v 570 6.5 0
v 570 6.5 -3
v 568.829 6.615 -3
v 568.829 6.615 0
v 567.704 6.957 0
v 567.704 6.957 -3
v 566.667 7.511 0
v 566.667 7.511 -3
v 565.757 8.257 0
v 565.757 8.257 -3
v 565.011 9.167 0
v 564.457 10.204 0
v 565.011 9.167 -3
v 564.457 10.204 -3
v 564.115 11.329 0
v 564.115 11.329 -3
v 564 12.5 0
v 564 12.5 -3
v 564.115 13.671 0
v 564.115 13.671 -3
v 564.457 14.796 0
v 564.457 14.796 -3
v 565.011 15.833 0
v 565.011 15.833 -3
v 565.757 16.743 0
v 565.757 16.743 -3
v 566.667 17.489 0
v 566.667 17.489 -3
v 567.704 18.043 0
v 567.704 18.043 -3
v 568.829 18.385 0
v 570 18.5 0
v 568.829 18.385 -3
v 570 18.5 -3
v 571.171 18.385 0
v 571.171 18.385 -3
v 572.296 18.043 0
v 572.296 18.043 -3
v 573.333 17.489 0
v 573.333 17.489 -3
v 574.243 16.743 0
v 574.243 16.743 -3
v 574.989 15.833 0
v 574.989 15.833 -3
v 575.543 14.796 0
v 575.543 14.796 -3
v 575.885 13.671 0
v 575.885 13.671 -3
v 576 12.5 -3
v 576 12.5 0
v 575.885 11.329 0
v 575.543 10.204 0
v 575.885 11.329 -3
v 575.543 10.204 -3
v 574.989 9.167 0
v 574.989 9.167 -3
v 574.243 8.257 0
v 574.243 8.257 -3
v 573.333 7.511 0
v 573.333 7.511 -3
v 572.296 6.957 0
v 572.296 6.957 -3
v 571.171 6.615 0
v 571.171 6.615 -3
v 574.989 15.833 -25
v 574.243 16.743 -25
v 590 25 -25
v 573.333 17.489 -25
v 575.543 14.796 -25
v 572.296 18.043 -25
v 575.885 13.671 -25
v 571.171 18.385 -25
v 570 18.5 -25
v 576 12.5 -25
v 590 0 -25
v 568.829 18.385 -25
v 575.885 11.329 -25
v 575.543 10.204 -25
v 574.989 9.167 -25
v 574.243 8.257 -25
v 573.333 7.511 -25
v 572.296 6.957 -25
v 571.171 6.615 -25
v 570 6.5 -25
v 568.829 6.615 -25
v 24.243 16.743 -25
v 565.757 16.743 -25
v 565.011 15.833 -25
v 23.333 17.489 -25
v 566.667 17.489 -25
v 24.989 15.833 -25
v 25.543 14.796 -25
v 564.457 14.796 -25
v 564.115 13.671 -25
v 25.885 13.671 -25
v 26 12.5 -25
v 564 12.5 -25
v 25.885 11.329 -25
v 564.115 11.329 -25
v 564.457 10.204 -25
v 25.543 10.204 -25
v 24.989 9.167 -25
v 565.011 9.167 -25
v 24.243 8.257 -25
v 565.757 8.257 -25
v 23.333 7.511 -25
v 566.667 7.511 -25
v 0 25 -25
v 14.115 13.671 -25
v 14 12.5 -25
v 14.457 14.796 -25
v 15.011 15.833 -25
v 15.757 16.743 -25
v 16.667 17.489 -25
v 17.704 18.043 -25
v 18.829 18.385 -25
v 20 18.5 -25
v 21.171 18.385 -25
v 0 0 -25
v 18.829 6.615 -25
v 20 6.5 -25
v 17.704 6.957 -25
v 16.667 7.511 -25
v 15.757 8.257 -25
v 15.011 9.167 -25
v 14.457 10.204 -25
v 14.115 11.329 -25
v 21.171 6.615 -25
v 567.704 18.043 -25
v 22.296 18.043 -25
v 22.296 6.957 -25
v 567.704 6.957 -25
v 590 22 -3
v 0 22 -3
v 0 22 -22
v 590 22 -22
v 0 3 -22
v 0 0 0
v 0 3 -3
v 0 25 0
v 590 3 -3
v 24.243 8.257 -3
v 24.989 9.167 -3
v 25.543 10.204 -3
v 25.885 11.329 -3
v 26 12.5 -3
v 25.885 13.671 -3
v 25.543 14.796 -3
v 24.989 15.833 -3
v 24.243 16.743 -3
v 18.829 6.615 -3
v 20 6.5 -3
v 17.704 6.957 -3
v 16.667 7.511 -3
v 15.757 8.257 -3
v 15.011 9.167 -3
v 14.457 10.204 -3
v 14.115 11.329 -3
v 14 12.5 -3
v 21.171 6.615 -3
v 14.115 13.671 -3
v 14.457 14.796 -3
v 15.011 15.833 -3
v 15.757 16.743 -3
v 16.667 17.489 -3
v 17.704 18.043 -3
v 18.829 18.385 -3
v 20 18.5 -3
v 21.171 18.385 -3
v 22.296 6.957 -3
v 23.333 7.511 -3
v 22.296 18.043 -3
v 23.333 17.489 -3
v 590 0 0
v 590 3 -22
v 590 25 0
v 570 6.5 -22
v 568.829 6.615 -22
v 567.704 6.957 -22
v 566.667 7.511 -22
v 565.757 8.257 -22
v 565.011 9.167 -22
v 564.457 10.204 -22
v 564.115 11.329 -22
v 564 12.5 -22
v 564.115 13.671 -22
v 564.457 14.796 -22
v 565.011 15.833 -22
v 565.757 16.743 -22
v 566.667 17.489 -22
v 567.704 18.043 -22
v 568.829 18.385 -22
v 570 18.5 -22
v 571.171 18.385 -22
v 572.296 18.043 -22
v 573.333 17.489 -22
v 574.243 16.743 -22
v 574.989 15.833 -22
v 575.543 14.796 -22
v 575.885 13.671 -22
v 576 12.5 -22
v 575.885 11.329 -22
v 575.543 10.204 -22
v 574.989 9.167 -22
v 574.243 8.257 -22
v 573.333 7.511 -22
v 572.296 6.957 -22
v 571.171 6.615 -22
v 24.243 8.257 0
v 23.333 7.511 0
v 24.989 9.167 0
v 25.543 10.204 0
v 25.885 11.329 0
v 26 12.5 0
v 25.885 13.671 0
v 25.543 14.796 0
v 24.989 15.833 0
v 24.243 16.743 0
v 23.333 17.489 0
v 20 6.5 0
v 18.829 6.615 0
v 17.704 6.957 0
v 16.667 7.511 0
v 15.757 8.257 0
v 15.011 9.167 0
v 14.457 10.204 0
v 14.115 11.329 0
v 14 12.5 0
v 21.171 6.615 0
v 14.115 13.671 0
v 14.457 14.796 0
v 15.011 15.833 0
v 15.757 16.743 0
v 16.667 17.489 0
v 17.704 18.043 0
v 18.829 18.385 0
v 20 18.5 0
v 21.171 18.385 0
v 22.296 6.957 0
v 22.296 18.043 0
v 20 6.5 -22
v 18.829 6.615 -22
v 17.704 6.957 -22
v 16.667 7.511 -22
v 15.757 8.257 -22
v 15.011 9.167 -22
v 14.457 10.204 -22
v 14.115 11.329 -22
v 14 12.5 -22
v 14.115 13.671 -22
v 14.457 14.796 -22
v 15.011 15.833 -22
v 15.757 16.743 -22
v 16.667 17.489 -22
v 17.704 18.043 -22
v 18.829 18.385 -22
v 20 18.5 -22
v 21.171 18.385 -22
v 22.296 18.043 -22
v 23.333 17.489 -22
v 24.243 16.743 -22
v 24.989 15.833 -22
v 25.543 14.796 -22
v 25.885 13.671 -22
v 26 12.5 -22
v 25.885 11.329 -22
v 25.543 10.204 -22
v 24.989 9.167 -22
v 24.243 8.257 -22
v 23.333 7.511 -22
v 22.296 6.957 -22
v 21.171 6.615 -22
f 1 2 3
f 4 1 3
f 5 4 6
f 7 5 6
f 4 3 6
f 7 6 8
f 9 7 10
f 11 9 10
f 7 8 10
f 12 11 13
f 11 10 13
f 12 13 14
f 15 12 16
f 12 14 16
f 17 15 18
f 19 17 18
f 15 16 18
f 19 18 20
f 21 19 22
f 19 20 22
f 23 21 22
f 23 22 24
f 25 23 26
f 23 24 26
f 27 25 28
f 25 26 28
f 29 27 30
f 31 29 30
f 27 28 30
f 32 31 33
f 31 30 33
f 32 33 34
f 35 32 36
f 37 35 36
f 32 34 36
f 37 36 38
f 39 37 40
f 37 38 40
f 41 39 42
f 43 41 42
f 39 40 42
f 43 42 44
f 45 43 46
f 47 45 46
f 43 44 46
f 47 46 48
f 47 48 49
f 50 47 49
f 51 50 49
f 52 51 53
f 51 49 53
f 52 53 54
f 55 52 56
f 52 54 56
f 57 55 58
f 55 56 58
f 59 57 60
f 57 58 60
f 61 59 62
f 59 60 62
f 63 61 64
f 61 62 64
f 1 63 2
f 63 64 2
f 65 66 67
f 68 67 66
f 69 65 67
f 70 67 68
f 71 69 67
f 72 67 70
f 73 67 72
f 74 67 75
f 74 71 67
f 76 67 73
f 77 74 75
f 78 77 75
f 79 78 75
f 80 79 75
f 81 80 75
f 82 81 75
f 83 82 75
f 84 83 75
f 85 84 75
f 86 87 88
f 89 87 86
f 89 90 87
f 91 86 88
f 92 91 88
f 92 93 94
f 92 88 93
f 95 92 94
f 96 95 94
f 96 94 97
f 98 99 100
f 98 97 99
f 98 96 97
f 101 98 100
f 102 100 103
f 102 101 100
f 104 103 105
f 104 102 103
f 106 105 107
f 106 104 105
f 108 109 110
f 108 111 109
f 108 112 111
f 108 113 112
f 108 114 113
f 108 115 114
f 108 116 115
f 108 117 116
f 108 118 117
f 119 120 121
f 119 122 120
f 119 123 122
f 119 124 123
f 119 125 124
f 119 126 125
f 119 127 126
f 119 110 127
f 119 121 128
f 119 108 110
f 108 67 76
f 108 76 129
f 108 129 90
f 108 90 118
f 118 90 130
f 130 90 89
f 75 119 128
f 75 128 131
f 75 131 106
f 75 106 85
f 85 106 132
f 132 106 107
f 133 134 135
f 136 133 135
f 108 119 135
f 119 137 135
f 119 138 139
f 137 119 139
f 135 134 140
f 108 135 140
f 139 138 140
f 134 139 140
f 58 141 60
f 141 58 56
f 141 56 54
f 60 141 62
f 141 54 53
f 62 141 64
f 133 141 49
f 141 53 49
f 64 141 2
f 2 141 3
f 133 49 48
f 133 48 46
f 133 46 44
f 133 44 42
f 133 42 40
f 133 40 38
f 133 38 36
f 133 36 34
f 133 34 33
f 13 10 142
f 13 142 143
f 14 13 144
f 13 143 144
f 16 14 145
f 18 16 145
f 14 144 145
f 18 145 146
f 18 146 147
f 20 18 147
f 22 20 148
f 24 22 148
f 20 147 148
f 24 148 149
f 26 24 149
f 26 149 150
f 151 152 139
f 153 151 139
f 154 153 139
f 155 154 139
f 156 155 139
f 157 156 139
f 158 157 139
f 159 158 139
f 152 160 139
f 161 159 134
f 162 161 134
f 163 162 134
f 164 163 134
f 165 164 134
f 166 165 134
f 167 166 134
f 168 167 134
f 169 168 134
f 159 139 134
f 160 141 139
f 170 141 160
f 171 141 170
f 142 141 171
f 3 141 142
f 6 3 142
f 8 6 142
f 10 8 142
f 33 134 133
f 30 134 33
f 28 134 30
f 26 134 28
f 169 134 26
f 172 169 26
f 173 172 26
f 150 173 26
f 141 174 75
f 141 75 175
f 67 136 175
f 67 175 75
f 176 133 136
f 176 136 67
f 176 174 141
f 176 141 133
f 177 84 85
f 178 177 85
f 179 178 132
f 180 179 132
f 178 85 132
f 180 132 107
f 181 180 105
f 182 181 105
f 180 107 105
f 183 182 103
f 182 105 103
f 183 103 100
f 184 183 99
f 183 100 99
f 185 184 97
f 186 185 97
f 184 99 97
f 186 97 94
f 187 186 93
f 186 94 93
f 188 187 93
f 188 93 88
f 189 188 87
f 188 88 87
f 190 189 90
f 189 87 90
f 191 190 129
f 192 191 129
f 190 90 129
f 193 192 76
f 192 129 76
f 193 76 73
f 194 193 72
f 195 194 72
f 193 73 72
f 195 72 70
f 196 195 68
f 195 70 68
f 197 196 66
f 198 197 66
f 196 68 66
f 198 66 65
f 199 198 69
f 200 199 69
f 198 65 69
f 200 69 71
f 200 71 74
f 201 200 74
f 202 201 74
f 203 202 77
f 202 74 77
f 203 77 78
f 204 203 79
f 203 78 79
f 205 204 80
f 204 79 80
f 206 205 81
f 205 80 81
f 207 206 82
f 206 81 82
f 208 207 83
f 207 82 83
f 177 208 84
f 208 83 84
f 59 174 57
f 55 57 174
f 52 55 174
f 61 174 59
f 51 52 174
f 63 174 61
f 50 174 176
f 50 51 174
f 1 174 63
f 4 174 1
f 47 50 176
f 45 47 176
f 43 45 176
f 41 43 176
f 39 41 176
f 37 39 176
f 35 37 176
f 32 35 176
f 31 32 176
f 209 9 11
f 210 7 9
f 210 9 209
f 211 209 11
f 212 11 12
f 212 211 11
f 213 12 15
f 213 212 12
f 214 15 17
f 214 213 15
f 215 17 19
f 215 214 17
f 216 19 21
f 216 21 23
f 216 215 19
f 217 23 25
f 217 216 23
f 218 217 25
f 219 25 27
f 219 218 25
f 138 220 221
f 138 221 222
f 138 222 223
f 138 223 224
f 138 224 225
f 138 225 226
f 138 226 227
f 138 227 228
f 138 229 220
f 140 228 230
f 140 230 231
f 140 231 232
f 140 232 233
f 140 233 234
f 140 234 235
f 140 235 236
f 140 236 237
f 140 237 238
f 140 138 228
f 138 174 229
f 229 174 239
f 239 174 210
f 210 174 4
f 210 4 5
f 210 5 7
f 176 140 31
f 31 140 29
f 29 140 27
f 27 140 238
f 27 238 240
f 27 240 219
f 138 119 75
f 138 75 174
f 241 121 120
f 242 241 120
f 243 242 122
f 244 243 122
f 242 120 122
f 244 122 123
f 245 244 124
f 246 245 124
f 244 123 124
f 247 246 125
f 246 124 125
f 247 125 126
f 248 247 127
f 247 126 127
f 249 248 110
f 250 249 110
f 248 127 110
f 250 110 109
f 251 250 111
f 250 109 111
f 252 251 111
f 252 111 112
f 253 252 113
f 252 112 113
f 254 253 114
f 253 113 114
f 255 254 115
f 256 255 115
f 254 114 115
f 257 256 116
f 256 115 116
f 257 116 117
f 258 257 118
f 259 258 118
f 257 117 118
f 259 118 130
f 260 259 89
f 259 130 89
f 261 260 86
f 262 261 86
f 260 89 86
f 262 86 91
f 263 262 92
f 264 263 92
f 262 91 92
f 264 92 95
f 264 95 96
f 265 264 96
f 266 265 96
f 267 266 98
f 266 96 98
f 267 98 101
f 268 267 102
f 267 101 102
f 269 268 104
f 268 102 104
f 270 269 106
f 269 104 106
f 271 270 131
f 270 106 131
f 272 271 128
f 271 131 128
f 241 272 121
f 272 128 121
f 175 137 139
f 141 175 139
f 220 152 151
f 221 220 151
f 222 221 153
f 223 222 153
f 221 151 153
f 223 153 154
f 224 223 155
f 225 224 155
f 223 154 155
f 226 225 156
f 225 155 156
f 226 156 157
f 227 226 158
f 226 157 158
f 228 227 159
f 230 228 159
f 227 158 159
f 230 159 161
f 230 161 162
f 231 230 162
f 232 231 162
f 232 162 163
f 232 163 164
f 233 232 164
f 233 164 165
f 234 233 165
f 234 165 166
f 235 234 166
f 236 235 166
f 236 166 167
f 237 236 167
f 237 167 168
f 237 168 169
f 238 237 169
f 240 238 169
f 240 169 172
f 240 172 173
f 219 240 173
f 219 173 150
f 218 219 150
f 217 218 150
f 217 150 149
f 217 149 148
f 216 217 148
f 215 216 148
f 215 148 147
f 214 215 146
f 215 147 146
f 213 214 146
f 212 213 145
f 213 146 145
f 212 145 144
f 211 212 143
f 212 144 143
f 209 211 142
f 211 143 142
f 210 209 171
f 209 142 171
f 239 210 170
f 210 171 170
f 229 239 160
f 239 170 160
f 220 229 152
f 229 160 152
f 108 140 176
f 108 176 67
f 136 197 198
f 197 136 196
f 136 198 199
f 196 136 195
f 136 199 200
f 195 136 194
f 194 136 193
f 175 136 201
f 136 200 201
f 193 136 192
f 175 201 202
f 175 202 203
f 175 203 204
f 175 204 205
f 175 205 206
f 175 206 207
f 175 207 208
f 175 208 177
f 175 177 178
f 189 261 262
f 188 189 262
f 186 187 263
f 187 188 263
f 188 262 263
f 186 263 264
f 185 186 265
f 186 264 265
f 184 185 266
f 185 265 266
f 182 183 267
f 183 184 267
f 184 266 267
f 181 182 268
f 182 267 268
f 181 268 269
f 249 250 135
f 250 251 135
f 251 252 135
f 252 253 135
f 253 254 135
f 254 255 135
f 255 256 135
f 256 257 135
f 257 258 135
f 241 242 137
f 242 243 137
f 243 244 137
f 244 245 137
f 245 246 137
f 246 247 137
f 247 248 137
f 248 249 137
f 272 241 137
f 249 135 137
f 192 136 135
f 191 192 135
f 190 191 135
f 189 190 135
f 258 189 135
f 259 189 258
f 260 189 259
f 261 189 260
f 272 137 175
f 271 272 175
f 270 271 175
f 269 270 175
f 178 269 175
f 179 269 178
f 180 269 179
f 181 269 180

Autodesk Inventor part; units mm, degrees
ref_plane "YZ Plane" through (0, 0, 0) normal (1, 0, 0) x (0, 1, 0)
ref_plane "XZ Plane" through (0, 0, 0) normal (0, 1, 0) x (-1, 0, 0)
ref_plane "XY Plane" through (0, 0, 0) normal (0, 0, 1) x (1, 0, 0)
sketch "Sketch1" plane through (0, 0, 0) normal (1, 0, 0) x (0, 1, 0)
  line L0 (0, 0) -> (25, 0)
  line L1 (25, 0) -> (25, -25)
  line L2 (25, -25) -> (0, -25)
  line L3 (0, -25) -> (0, 0)
  line L4 (3, -3) -> (22, -3)
  line L5 (22, -3) -> (22, -22)
  line L6 (22, -22) -> (3, -22)
  line L7 (3, -22) -> (3, -3)
  dimension "d0" = 25
  dimension "d1" = 25
  dimension "d2" = 3
extrude "Extrusion1" add sketch "Sketch1" along normal blind 590
sketch "Sketch2" plane through (0, 0, 0) normal (0, 0, 1) x (1, 0, 0)
  line L0 (0, 25) -> (590, 25) projected
  line L1 (0, 0) -> (590, 0) projected
  point P0 (20, 12.5)
  point P1 (570, 12.5)
  point P2 (295, 25)
  dimension "d5" = 550
  dimension "d6" = 275
  dimension "d7" = 12.5
  dimension "d15" = 12.5
hole "Hole1" at (20, 12.5, 0) at (570, 12.5, 0) direction (0, 0, -1) diameter 12 end through all
properties part number "P001" material "Aluminum 6061"
